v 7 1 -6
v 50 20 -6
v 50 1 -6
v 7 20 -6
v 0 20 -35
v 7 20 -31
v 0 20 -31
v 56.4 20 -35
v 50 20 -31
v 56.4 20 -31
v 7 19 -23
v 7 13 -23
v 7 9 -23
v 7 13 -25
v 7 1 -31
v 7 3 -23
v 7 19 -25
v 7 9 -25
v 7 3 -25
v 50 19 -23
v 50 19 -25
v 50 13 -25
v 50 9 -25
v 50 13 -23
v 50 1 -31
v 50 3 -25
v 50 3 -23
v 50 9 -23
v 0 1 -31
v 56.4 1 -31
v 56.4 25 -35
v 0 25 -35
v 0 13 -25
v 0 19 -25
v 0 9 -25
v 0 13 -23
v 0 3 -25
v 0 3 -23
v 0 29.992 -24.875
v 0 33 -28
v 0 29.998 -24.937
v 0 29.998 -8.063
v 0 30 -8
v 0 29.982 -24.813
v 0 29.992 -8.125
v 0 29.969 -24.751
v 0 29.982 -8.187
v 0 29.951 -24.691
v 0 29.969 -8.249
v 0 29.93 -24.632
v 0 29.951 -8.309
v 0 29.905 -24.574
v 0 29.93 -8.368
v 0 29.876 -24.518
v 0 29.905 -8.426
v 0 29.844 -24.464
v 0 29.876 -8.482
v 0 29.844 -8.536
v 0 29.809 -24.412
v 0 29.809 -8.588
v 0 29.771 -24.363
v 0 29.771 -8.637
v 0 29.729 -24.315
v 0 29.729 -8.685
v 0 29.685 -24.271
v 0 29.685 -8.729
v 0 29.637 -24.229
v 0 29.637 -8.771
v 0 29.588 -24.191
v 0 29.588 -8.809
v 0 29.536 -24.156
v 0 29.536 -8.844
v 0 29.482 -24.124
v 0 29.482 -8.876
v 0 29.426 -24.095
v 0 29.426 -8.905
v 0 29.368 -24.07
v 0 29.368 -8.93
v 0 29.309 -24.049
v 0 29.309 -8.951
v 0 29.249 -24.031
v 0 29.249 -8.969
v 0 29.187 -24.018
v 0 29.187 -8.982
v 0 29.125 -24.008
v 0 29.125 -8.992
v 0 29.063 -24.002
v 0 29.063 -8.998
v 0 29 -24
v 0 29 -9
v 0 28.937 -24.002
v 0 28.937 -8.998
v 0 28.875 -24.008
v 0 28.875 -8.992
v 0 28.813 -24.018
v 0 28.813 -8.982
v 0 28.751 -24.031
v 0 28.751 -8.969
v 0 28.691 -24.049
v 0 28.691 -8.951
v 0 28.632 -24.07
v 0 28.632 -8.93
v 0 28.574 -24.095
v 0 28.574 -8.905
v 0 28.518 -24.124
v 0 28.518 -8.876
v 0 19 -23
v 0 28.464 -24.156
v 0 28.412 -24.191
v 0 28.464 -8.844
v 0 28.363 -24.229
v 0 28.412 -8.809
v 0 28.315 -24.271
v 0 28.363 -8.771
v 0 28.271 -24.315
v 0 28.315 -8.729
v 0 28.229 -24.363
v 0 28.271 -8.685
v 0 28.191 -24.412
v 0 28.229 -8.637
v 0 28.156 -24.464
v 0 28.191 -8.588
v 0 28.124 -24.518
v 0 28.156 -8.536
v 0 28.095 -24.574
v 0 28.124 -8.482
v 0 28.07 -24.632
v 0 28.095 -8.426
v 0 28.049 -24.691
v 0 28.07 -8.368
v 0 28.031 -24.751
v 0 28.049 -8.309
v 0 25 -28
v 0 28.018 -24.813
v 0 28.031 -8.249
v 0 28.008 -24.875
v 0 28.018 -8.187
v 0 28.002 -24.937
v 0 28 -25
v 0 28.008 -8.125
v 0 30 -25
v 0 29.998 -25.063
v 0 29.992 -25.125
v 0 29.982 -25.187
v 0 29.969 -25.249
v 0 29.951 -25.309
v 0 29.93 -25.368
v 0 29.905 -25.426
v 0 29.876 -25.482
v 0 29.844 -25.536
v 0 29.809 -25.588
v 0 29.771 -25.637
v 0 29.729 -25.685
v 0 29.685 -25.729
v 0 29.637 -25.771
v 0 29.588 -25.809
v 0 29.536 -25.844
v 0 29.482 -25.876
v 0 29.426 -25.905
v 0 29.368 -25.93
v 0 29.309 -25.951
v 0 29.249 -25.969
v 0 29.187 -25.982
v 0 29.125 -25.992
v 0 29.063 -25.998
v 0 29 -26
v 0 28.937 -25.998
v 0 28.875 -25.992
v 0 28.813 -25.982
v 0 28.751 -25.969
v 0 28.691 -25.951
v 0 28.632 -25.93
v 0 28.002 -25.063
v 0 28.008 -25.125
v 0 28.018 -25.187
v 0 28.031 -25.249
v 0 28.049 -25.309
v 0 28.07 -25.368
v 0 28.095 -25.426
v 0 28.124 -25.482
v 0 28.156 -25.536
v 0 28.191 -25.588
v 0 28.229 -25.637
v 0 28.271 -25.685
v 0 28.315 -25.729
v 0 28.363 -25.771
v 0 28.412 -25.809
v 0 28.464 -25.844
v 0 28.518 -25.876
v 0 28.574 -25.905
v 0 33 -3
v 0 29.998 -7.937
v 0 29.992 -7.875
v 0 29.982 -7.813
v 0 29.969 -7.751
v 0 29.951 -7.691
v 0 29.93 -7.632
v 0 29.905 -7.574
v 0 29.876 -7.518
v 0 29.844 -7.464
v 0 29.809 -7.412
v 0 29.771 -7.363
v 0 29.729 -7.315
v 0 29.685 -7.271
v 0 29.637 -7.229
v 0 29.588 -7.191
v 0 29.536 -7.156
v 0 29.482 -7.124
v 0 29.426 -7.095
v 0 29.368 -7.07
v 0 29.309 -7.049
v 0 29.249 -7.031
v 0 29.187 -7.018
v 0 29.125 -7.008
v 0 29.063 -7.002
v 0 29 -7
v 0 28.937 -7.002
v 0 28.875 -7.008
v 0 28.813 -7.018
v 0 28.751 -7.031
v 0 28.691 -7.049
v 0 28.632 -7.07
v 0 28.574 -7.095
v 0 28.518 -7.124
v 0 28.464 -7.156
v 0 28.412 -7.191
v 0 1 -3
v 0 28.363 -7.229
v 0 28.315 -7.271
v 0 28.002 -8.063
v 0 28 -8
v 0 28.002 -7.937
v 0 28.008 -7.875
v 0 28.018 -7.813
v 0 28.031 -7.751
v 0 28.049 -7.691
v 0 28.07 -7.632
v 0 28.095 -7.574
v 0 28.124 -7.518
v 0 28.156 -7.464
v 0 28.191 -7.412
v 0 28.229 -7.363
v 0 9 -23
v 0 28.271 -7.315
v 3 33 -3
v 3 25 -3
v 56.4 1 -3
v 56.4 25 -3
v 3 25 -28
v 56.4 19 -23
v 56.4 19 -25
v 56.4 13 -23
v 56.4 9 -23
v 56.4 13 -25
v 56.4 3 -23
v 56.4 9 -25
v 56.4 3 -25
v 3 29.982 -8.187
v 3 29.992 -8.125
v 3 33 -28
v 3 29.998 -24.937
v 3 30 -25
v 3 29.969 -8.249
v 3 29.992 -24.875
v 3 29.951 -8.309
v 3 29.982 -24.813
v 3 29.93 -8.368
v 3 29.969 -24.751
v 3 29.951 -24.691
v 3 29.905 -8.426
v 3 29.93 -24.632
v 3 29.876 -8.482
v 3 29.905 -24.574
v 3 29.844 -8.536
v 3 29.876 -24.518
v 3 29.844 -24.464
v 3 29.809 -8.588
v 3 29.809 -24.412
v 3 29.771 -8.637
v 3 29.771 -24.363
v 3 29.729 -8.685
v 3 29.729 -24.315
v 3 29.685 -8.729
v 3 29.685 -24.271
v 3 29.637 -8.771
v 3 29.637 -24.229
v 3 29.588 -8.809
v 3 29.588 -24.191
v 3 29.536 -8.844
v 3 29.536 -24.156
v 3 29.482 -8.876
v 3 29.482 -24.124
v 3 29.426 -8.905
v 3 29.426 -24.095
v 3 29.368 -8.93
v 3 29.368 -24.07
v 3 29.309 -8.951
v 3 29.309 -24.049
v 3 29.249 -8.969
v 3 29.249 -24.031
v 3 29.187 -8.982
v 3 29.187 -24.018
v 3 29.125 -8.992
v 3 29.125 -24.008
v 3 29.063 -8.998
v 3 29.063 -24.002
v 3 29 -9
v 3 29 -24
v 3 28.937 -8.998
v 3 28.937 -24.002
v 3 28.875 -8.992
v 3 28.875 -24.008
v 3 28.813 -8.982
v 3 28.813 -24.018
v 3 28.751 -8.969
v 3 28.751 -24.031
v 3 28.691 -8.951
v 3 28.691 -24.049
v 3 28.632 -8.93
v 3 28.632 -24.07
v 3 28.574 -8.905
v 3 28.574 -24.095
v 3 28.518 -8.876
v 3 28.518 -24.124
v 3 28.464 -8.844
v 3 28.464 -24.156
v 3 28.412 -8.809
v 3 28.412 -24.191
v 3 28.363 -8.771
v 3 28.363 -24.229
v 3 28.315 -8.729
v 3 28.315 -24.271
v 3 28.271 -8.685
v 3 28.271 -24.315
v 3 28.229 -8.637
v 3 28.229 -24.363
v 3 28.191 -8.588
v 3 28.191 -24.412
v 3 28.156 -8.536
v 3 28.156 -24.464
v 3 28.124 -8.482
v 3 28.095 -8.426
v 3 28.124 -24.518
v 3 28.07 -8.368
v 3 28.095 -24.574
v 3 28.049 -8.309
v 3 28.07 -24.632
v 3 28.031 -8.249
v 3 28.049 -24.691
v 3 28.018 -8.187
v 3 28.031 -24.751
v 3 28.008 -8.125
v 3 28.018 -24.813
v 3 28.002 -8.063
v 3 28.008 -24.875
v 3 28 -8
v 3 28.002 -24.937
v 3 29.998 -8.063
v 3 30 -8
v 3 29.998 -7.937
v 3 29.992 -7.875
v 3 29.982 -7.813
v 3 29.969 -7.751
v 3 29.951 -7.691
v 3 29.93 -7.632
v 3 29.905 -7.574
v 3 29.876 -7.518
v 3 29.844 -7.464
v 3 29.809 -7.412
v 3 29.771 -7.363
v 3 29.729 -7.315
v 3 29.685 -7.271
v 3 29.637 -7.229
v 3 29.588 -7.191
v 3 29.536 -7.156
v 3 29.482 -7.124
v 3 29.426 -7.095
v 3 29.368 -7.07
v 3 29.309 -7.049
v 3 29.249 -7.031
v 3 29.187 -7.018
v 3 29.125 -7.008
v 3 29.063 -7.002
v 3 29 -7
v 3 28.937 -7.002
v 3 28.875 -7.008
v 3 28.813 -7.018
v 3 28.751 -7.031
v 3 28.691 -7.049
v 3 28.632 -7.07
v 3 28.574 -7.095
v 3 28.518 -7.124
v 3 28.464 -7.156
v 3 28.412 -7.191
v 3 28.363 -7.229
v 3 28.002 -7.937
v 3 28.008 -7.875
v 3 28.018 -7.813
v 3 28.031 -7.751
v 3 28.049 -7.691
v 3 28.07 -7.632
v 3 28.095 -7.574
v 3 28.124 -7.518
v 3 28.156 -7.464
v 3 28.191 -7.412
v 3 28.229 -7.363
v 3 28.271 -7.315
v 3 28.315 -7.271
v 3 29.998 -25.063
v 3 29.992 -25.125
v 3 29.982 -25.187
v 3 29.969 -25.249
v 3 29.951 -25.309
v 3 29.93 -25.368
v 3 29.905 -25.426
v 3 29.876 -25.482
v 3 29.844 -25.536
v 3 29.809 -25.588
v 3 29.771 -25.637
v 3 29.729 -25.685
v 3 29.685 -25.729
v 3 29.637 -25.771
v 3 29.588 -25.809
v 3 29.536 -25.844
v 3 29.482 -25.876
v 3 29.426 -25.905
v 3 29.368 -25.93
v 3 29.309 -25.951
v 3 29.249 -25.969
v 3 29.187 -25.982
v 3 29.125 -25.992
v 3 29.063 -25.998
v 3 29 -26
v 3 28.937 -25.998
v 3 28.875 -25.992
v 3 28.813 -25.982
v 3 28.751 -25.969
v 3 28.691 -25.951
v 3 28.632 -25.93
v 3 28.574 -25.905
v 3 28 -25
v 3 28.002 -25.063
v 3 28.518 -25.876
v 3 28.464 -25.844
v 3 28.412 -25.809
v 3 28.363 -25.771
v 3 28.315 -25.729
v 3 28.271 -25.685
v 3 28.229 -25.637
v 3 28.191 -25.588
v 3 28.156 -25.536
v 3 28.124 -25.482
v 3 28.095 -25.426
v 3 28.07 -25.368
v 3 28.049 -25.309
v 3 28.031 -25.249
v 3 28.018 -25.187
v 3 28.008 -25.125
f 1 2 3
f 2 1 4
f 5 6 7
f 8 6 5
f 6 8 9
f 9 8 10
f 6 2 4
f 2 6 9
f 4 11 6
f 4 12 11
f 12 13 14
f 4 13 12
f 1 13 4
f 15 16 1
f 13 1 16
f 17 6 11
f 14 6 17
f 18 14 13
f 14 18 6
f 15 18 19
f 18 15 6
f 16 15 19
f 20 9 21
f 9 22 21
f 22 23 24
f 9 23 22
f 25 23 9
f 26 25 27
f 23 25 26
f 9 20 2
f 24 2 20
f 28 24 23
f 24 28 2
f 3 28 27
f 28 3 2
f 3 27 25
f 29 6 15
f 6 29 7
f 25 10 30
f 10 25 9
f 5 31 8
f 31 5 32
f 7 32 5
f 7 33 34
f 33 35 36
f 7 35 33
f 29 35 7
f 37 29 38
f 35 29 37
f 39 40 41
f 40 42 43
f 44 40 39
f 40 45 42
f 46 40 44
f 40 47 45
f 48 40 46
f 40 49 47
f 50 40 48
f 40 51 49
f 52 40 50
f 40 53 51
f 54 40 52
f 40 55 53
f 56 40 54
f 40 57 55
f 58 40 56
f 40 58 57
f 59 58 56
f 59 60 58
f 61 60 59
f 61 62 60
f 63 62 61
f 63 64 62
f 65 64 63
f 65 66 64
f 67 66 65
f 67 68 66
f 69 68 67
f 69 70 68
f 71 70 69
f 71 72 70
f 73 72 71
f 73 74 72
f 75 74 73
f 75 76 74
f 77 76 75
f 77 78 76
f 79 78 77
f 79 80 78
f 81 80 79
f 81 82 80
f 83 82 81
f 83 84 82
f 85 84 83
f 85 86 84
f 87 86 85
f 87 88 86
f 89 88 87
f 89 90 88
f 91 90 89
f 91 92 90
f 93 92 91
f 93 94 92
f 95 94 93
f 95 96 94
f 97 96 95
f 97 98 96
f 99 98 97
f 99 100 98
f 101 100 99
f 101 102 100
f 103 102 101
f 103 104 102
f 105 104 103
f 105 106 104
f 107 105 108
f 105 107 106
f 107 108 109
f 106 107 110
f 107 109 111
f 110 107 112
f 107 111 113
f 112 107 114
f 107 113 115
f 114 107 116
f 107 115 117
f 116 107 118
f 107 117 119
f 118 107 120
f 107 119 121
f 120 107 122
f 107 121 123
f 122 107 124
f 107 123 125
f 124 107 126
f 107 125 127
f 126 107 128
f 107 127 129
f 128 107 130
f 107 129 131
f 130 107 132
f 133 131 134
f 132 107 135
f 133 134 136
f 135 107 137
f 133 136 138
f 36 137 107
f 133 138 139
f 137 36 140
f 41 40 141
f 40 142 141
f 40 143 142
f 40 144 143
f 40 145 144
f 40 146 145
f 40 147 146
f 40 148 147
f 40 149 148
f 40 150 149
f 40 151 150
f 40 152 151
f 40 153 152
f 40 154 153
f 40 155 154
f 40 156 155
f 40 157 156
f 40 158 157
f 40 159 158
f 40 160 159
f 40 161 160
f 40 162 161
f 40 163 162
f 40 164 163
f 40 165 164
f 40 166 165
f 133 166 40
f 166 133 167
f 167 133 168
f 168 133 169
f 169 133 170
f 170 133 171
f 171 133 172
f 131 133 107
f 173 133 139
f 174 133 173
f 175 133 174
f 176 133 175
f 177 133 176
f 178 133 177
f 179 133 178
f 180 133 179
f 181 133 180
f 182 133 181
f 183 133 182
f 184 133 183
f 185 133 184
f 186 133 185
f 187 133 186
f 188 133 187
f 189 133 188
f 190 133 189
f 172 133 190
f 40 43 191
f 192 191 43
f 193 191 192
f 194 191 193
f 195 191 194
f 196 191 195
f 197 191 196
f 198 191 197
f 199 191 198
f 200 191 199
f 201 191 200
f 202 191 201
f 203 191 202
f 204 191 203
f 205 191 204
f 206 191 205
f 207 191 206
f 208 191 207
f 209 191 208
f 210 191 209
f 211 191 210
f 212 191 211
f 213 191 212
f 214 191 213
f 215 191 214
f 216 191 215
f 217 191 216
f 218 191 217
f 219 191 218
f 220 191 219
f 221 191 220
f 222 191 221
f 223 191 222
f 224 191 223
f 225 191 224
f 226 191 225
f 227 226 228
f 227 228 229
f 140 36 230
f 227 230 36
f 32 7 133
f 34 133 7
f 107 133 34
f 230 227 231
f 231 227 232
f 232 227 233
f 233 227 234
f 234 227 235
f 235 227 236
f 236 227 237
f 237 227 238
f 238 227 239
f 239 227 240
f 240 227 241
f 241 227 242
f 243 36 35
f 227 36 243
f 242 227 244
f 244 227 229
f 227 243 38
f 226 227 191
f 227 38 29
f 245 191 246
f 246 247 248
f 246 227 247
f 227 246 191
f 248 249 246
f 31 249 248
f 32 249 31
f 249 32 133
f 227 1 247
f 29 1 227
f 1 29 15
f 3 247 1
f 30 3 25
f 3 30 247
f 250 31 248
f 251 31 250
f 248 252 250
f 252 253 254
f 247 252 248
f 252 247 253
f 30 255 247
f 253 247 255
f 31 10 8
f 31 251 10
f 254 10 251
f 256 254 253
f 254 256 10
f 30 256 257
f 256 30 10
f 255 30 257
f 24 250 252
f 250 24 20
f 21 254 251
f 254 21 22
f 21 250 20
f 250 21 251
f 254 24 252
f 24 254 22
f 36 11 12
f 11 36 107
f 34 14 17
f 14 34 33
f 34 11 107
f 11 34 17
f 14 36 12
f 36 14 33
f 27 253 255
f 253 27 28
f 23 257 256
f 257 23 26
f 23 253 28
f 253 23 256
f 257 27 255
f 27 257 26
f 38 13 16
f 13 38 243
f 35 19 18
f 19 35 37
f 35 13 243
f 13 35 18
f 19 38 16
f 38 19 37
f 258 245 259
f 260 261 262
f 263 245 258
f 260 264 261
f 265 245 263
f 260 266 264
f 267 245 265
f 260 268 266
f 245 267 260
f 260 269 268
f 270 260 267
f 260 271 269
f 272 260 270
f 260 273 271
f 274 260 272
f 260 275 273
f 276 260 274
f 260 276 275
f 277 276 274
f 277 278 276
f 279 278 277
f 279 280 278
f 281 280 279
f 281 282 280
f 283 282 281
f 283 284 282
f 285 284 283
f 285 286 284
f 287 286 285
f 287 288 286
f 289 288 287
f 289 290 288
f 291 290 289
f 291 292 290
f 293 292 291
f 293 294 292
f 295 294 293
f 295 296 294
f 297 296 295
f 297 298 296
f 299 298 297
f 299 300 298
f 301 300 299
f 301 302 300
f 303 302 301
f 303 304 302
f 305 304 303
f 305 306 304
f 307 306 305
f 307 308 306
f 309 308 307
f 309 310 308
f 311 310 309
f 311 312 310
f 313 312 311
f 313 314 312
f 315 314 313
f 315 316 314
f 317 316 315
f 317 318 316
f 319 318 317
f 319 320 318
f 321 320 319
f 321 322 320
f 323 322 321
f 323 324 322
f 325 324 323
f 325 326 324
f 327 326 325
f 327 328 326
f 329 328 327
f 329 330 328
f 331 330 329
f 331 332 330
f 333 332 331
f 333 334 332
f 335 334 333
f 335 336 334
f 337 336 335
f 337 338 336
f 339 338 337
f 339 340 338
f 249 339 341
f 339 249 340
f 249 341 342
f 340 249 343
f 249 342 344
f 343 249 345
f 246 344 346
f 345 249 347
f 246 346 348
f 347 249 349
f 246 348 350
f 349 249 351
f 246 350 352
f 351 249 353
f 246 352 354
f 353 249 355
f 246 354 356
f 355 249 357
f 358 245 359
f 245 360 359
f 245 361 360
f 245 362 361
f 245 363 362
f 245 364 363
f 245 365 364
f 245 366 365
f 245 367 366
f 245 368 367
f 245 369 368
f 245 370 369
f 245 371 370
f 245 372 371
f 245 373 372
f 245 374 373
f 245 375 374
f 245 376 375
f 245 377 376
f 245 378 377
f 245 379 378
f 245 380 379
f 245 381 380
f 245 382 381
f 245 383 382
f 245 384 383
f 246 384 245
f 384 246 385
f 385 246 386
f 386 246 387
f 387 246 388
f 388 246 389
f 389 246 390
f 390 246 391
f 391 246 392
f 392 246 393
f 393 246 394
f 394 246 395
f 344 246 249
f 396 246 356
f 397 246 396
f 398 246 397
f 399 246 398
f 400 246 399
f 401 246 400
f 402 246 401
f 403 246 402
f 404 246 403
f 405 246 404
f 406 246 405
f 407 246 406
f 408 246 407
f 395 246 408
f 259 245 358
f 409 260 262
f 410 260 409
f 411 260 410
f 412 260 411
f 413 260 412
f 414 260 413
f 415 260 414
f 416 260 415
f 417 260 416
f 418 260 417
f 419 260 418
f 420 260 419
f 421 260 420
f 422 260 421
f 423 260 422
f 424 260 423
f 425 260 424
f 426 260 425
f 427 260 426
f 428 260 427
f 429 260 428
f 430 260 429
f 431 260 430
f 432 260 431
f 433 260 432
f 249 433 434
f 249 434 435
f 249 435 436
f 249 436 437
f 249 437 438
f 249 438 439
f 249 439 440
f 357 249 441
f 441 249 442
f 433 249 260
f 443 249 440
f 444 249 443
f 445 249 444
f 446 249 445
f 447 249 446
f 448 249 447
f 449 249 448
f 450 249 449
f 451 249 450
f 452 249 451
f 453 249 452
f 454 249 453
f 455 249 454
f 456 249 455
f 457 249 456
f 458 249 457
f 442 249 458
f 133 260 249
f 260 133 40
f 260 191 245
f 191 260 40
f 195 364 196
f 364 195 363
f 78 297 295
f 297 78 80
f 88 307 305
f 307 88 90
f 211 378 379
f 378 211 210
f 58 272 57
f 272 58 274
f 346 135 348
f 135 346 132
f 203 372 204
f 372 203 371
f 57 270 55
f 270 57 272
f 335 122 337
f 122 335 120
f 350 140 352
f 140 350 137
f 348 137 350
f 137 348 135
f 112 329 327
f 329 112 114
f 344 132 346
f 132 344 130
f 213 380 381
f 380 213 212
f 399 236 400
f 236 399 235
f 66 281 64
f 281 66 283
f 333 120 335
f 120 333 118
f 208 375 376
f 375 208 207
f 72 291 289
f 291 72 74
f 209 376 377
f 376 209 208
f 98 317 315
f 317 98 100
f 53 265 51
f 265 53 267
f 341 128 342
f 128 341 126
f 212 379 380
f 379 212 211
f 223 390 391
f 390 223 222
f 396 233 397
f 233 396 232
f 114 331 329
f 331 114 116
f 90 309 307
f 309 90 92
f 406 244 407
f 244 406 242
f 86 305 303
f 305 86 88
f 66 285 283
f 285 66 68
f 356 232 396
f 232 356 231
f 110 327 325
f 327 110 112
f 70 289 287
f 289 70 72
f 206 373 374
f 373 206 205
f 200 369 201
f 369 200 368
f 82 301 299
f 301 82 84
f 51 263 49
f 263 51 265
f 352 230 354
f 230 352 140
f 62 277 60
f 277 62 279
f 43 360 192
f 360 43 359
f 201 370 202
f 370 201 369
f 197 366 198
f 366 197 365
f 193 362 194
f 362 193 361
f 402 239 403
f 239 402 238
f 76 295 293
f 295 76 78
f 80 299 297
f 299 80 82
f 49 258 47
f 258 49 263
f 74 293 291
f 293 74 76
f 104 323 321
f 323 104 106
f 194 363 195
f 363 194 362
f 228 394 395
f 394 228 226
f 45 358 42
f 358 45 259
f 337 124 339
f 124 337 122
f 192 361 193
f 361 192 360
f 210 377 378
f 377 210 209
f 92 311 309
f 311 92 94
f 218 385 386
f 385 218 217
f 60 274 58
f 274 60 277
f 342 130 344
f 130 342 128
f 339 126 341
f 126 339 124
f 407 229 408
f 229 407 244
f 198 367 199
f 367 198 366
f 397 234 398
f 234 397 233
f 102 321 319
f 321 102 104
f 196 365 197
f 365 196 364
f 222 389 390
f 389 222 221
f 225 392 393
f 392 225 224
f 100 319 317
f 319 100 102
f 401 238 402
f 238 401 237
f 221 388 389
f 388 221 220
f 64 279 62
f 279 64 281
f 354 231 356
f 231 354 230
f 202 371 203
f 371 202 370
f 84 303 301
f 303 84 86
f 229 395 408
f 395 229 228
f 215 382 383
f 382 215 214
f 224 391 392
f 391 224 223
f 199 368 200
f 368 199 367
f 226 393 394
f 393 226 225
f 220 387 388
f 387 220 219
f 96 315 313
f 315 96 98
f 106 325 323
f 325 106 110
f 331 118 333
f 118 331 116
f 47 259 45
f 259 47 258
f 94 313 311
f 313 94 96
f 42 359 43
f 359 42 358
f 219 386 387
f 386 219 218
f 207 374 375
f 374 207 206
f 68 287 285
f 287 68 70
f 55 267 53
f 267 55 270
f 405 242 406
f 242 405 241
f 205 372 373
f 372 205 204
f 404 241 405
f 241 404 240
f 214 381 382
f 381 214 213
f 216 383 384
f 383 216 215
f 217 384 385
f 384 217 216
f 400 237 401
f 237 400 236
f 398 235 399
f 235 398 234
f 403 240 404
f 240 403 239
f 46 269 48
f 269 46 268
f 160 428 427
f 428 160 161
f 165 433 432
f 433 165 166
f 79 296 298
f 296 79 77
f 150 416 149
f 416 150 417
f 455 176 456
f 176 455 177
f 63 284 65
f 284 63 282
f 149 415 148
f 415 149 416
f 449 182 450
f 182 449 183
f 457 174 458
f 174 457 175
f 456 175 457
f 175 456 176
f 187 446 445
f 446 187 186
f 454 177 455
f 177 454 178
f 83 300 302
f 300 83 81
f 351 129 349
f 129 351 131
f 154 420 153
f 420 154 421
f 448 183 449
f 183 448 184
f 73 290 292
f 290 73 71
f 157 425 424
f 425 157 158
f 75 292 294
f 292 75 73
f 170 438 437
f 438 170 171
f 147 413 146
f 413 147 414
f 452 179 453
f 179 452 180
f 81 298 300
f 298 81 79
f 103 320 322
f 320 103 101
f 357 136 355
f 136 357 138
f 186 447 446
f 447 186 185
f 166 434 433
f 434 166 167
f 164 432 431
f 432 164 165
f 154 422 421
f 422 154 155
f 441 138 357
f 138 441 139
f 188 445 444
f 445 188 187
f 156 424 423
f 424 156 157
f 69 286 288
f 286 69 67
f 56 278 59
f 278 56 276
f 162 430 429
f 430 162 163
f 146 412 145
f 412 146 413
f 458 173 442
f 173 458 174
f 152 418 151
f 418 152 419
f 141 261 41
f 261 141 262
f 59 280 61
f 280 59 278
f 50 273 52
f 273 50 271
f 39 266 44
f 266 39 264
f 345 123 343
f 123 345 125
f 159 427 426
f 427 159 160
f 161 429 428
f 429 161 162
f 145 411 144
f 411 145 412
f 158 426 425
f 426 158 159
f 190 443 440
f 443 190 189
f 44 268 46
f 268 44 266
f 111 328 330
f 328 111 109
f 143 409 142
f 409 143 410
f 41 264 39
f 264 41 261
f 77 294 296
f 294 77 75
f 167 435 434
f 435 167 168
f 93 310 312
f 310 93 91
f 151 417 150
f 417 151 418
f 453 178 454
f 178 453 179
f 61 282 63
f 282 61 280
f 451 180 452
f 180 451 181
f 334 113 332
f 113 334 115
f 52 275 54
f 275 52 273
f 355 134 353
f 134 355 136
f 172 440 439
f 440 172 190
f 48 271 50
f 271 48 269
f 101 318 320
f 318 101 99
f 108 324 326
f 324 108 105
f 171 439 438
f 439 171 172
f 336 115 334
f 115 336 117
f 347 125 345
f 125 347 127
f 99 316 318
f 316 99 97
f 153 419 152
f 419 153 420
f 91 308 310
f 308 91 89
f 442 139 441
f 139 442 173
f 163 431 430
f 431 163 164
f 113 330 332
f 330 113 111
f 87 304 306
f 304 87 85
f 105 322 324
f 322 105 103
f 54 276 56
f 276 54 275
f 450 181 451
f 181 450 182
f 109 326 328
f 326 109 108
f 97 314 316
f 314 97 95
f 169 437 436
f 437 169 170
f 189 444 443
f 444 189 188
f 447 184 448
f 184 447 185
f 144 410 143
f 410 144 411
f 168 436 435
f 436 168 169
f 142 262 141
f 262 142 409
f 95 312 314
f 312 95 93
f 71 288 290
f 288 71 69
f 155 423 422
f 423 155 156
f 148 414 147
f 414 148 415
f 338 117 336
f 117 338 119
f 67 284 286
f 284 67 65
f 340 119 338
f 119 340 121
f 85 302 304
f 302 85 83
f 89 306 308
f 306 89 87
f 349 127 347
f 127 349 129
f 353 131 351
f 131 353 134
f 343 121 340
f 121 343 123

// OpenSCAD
$fn=100;

module base()
{
		translate([0,25,-28]) cube([3,8,25]);
}

module vis()
{
	#rotate([0,90,0]) translate([8,29,0]) cylinder(d=2, h=10);
	#rotate([0,90,0]) translate([25,29,0]) cylinder(d=2, h=10);
}

module servo()
{
	translate([0,0,0])       cube([20,43,36]);
   #translate([0,-6.5,25]) cube([20,57,10]);
   translate([10,10,36]) cylinder(d=15, h=2);
}

module porte_servo()
{
	difference()
	{
		translate([0,25,-3]) rotate([180,0,0]) cube([56.4,24,32]);
		translate([50,20,-6]) rotate([180,0,270]) servo();
		//translate([50,7,-9]) cube([7,9,3]);
		#translate([49,13,-25]) cube([8,6,2]);
		translate([-1,13,-25]) cube([9,6,2]);
        #translate([49,3,-25]) cube([8,6,2]);
		translate([-1,3,-25]) cube([9,6,2]);
	}
}

difference()
{
	union()
	{
		base();
		porte_servo();
	}
		vis();
	
}
